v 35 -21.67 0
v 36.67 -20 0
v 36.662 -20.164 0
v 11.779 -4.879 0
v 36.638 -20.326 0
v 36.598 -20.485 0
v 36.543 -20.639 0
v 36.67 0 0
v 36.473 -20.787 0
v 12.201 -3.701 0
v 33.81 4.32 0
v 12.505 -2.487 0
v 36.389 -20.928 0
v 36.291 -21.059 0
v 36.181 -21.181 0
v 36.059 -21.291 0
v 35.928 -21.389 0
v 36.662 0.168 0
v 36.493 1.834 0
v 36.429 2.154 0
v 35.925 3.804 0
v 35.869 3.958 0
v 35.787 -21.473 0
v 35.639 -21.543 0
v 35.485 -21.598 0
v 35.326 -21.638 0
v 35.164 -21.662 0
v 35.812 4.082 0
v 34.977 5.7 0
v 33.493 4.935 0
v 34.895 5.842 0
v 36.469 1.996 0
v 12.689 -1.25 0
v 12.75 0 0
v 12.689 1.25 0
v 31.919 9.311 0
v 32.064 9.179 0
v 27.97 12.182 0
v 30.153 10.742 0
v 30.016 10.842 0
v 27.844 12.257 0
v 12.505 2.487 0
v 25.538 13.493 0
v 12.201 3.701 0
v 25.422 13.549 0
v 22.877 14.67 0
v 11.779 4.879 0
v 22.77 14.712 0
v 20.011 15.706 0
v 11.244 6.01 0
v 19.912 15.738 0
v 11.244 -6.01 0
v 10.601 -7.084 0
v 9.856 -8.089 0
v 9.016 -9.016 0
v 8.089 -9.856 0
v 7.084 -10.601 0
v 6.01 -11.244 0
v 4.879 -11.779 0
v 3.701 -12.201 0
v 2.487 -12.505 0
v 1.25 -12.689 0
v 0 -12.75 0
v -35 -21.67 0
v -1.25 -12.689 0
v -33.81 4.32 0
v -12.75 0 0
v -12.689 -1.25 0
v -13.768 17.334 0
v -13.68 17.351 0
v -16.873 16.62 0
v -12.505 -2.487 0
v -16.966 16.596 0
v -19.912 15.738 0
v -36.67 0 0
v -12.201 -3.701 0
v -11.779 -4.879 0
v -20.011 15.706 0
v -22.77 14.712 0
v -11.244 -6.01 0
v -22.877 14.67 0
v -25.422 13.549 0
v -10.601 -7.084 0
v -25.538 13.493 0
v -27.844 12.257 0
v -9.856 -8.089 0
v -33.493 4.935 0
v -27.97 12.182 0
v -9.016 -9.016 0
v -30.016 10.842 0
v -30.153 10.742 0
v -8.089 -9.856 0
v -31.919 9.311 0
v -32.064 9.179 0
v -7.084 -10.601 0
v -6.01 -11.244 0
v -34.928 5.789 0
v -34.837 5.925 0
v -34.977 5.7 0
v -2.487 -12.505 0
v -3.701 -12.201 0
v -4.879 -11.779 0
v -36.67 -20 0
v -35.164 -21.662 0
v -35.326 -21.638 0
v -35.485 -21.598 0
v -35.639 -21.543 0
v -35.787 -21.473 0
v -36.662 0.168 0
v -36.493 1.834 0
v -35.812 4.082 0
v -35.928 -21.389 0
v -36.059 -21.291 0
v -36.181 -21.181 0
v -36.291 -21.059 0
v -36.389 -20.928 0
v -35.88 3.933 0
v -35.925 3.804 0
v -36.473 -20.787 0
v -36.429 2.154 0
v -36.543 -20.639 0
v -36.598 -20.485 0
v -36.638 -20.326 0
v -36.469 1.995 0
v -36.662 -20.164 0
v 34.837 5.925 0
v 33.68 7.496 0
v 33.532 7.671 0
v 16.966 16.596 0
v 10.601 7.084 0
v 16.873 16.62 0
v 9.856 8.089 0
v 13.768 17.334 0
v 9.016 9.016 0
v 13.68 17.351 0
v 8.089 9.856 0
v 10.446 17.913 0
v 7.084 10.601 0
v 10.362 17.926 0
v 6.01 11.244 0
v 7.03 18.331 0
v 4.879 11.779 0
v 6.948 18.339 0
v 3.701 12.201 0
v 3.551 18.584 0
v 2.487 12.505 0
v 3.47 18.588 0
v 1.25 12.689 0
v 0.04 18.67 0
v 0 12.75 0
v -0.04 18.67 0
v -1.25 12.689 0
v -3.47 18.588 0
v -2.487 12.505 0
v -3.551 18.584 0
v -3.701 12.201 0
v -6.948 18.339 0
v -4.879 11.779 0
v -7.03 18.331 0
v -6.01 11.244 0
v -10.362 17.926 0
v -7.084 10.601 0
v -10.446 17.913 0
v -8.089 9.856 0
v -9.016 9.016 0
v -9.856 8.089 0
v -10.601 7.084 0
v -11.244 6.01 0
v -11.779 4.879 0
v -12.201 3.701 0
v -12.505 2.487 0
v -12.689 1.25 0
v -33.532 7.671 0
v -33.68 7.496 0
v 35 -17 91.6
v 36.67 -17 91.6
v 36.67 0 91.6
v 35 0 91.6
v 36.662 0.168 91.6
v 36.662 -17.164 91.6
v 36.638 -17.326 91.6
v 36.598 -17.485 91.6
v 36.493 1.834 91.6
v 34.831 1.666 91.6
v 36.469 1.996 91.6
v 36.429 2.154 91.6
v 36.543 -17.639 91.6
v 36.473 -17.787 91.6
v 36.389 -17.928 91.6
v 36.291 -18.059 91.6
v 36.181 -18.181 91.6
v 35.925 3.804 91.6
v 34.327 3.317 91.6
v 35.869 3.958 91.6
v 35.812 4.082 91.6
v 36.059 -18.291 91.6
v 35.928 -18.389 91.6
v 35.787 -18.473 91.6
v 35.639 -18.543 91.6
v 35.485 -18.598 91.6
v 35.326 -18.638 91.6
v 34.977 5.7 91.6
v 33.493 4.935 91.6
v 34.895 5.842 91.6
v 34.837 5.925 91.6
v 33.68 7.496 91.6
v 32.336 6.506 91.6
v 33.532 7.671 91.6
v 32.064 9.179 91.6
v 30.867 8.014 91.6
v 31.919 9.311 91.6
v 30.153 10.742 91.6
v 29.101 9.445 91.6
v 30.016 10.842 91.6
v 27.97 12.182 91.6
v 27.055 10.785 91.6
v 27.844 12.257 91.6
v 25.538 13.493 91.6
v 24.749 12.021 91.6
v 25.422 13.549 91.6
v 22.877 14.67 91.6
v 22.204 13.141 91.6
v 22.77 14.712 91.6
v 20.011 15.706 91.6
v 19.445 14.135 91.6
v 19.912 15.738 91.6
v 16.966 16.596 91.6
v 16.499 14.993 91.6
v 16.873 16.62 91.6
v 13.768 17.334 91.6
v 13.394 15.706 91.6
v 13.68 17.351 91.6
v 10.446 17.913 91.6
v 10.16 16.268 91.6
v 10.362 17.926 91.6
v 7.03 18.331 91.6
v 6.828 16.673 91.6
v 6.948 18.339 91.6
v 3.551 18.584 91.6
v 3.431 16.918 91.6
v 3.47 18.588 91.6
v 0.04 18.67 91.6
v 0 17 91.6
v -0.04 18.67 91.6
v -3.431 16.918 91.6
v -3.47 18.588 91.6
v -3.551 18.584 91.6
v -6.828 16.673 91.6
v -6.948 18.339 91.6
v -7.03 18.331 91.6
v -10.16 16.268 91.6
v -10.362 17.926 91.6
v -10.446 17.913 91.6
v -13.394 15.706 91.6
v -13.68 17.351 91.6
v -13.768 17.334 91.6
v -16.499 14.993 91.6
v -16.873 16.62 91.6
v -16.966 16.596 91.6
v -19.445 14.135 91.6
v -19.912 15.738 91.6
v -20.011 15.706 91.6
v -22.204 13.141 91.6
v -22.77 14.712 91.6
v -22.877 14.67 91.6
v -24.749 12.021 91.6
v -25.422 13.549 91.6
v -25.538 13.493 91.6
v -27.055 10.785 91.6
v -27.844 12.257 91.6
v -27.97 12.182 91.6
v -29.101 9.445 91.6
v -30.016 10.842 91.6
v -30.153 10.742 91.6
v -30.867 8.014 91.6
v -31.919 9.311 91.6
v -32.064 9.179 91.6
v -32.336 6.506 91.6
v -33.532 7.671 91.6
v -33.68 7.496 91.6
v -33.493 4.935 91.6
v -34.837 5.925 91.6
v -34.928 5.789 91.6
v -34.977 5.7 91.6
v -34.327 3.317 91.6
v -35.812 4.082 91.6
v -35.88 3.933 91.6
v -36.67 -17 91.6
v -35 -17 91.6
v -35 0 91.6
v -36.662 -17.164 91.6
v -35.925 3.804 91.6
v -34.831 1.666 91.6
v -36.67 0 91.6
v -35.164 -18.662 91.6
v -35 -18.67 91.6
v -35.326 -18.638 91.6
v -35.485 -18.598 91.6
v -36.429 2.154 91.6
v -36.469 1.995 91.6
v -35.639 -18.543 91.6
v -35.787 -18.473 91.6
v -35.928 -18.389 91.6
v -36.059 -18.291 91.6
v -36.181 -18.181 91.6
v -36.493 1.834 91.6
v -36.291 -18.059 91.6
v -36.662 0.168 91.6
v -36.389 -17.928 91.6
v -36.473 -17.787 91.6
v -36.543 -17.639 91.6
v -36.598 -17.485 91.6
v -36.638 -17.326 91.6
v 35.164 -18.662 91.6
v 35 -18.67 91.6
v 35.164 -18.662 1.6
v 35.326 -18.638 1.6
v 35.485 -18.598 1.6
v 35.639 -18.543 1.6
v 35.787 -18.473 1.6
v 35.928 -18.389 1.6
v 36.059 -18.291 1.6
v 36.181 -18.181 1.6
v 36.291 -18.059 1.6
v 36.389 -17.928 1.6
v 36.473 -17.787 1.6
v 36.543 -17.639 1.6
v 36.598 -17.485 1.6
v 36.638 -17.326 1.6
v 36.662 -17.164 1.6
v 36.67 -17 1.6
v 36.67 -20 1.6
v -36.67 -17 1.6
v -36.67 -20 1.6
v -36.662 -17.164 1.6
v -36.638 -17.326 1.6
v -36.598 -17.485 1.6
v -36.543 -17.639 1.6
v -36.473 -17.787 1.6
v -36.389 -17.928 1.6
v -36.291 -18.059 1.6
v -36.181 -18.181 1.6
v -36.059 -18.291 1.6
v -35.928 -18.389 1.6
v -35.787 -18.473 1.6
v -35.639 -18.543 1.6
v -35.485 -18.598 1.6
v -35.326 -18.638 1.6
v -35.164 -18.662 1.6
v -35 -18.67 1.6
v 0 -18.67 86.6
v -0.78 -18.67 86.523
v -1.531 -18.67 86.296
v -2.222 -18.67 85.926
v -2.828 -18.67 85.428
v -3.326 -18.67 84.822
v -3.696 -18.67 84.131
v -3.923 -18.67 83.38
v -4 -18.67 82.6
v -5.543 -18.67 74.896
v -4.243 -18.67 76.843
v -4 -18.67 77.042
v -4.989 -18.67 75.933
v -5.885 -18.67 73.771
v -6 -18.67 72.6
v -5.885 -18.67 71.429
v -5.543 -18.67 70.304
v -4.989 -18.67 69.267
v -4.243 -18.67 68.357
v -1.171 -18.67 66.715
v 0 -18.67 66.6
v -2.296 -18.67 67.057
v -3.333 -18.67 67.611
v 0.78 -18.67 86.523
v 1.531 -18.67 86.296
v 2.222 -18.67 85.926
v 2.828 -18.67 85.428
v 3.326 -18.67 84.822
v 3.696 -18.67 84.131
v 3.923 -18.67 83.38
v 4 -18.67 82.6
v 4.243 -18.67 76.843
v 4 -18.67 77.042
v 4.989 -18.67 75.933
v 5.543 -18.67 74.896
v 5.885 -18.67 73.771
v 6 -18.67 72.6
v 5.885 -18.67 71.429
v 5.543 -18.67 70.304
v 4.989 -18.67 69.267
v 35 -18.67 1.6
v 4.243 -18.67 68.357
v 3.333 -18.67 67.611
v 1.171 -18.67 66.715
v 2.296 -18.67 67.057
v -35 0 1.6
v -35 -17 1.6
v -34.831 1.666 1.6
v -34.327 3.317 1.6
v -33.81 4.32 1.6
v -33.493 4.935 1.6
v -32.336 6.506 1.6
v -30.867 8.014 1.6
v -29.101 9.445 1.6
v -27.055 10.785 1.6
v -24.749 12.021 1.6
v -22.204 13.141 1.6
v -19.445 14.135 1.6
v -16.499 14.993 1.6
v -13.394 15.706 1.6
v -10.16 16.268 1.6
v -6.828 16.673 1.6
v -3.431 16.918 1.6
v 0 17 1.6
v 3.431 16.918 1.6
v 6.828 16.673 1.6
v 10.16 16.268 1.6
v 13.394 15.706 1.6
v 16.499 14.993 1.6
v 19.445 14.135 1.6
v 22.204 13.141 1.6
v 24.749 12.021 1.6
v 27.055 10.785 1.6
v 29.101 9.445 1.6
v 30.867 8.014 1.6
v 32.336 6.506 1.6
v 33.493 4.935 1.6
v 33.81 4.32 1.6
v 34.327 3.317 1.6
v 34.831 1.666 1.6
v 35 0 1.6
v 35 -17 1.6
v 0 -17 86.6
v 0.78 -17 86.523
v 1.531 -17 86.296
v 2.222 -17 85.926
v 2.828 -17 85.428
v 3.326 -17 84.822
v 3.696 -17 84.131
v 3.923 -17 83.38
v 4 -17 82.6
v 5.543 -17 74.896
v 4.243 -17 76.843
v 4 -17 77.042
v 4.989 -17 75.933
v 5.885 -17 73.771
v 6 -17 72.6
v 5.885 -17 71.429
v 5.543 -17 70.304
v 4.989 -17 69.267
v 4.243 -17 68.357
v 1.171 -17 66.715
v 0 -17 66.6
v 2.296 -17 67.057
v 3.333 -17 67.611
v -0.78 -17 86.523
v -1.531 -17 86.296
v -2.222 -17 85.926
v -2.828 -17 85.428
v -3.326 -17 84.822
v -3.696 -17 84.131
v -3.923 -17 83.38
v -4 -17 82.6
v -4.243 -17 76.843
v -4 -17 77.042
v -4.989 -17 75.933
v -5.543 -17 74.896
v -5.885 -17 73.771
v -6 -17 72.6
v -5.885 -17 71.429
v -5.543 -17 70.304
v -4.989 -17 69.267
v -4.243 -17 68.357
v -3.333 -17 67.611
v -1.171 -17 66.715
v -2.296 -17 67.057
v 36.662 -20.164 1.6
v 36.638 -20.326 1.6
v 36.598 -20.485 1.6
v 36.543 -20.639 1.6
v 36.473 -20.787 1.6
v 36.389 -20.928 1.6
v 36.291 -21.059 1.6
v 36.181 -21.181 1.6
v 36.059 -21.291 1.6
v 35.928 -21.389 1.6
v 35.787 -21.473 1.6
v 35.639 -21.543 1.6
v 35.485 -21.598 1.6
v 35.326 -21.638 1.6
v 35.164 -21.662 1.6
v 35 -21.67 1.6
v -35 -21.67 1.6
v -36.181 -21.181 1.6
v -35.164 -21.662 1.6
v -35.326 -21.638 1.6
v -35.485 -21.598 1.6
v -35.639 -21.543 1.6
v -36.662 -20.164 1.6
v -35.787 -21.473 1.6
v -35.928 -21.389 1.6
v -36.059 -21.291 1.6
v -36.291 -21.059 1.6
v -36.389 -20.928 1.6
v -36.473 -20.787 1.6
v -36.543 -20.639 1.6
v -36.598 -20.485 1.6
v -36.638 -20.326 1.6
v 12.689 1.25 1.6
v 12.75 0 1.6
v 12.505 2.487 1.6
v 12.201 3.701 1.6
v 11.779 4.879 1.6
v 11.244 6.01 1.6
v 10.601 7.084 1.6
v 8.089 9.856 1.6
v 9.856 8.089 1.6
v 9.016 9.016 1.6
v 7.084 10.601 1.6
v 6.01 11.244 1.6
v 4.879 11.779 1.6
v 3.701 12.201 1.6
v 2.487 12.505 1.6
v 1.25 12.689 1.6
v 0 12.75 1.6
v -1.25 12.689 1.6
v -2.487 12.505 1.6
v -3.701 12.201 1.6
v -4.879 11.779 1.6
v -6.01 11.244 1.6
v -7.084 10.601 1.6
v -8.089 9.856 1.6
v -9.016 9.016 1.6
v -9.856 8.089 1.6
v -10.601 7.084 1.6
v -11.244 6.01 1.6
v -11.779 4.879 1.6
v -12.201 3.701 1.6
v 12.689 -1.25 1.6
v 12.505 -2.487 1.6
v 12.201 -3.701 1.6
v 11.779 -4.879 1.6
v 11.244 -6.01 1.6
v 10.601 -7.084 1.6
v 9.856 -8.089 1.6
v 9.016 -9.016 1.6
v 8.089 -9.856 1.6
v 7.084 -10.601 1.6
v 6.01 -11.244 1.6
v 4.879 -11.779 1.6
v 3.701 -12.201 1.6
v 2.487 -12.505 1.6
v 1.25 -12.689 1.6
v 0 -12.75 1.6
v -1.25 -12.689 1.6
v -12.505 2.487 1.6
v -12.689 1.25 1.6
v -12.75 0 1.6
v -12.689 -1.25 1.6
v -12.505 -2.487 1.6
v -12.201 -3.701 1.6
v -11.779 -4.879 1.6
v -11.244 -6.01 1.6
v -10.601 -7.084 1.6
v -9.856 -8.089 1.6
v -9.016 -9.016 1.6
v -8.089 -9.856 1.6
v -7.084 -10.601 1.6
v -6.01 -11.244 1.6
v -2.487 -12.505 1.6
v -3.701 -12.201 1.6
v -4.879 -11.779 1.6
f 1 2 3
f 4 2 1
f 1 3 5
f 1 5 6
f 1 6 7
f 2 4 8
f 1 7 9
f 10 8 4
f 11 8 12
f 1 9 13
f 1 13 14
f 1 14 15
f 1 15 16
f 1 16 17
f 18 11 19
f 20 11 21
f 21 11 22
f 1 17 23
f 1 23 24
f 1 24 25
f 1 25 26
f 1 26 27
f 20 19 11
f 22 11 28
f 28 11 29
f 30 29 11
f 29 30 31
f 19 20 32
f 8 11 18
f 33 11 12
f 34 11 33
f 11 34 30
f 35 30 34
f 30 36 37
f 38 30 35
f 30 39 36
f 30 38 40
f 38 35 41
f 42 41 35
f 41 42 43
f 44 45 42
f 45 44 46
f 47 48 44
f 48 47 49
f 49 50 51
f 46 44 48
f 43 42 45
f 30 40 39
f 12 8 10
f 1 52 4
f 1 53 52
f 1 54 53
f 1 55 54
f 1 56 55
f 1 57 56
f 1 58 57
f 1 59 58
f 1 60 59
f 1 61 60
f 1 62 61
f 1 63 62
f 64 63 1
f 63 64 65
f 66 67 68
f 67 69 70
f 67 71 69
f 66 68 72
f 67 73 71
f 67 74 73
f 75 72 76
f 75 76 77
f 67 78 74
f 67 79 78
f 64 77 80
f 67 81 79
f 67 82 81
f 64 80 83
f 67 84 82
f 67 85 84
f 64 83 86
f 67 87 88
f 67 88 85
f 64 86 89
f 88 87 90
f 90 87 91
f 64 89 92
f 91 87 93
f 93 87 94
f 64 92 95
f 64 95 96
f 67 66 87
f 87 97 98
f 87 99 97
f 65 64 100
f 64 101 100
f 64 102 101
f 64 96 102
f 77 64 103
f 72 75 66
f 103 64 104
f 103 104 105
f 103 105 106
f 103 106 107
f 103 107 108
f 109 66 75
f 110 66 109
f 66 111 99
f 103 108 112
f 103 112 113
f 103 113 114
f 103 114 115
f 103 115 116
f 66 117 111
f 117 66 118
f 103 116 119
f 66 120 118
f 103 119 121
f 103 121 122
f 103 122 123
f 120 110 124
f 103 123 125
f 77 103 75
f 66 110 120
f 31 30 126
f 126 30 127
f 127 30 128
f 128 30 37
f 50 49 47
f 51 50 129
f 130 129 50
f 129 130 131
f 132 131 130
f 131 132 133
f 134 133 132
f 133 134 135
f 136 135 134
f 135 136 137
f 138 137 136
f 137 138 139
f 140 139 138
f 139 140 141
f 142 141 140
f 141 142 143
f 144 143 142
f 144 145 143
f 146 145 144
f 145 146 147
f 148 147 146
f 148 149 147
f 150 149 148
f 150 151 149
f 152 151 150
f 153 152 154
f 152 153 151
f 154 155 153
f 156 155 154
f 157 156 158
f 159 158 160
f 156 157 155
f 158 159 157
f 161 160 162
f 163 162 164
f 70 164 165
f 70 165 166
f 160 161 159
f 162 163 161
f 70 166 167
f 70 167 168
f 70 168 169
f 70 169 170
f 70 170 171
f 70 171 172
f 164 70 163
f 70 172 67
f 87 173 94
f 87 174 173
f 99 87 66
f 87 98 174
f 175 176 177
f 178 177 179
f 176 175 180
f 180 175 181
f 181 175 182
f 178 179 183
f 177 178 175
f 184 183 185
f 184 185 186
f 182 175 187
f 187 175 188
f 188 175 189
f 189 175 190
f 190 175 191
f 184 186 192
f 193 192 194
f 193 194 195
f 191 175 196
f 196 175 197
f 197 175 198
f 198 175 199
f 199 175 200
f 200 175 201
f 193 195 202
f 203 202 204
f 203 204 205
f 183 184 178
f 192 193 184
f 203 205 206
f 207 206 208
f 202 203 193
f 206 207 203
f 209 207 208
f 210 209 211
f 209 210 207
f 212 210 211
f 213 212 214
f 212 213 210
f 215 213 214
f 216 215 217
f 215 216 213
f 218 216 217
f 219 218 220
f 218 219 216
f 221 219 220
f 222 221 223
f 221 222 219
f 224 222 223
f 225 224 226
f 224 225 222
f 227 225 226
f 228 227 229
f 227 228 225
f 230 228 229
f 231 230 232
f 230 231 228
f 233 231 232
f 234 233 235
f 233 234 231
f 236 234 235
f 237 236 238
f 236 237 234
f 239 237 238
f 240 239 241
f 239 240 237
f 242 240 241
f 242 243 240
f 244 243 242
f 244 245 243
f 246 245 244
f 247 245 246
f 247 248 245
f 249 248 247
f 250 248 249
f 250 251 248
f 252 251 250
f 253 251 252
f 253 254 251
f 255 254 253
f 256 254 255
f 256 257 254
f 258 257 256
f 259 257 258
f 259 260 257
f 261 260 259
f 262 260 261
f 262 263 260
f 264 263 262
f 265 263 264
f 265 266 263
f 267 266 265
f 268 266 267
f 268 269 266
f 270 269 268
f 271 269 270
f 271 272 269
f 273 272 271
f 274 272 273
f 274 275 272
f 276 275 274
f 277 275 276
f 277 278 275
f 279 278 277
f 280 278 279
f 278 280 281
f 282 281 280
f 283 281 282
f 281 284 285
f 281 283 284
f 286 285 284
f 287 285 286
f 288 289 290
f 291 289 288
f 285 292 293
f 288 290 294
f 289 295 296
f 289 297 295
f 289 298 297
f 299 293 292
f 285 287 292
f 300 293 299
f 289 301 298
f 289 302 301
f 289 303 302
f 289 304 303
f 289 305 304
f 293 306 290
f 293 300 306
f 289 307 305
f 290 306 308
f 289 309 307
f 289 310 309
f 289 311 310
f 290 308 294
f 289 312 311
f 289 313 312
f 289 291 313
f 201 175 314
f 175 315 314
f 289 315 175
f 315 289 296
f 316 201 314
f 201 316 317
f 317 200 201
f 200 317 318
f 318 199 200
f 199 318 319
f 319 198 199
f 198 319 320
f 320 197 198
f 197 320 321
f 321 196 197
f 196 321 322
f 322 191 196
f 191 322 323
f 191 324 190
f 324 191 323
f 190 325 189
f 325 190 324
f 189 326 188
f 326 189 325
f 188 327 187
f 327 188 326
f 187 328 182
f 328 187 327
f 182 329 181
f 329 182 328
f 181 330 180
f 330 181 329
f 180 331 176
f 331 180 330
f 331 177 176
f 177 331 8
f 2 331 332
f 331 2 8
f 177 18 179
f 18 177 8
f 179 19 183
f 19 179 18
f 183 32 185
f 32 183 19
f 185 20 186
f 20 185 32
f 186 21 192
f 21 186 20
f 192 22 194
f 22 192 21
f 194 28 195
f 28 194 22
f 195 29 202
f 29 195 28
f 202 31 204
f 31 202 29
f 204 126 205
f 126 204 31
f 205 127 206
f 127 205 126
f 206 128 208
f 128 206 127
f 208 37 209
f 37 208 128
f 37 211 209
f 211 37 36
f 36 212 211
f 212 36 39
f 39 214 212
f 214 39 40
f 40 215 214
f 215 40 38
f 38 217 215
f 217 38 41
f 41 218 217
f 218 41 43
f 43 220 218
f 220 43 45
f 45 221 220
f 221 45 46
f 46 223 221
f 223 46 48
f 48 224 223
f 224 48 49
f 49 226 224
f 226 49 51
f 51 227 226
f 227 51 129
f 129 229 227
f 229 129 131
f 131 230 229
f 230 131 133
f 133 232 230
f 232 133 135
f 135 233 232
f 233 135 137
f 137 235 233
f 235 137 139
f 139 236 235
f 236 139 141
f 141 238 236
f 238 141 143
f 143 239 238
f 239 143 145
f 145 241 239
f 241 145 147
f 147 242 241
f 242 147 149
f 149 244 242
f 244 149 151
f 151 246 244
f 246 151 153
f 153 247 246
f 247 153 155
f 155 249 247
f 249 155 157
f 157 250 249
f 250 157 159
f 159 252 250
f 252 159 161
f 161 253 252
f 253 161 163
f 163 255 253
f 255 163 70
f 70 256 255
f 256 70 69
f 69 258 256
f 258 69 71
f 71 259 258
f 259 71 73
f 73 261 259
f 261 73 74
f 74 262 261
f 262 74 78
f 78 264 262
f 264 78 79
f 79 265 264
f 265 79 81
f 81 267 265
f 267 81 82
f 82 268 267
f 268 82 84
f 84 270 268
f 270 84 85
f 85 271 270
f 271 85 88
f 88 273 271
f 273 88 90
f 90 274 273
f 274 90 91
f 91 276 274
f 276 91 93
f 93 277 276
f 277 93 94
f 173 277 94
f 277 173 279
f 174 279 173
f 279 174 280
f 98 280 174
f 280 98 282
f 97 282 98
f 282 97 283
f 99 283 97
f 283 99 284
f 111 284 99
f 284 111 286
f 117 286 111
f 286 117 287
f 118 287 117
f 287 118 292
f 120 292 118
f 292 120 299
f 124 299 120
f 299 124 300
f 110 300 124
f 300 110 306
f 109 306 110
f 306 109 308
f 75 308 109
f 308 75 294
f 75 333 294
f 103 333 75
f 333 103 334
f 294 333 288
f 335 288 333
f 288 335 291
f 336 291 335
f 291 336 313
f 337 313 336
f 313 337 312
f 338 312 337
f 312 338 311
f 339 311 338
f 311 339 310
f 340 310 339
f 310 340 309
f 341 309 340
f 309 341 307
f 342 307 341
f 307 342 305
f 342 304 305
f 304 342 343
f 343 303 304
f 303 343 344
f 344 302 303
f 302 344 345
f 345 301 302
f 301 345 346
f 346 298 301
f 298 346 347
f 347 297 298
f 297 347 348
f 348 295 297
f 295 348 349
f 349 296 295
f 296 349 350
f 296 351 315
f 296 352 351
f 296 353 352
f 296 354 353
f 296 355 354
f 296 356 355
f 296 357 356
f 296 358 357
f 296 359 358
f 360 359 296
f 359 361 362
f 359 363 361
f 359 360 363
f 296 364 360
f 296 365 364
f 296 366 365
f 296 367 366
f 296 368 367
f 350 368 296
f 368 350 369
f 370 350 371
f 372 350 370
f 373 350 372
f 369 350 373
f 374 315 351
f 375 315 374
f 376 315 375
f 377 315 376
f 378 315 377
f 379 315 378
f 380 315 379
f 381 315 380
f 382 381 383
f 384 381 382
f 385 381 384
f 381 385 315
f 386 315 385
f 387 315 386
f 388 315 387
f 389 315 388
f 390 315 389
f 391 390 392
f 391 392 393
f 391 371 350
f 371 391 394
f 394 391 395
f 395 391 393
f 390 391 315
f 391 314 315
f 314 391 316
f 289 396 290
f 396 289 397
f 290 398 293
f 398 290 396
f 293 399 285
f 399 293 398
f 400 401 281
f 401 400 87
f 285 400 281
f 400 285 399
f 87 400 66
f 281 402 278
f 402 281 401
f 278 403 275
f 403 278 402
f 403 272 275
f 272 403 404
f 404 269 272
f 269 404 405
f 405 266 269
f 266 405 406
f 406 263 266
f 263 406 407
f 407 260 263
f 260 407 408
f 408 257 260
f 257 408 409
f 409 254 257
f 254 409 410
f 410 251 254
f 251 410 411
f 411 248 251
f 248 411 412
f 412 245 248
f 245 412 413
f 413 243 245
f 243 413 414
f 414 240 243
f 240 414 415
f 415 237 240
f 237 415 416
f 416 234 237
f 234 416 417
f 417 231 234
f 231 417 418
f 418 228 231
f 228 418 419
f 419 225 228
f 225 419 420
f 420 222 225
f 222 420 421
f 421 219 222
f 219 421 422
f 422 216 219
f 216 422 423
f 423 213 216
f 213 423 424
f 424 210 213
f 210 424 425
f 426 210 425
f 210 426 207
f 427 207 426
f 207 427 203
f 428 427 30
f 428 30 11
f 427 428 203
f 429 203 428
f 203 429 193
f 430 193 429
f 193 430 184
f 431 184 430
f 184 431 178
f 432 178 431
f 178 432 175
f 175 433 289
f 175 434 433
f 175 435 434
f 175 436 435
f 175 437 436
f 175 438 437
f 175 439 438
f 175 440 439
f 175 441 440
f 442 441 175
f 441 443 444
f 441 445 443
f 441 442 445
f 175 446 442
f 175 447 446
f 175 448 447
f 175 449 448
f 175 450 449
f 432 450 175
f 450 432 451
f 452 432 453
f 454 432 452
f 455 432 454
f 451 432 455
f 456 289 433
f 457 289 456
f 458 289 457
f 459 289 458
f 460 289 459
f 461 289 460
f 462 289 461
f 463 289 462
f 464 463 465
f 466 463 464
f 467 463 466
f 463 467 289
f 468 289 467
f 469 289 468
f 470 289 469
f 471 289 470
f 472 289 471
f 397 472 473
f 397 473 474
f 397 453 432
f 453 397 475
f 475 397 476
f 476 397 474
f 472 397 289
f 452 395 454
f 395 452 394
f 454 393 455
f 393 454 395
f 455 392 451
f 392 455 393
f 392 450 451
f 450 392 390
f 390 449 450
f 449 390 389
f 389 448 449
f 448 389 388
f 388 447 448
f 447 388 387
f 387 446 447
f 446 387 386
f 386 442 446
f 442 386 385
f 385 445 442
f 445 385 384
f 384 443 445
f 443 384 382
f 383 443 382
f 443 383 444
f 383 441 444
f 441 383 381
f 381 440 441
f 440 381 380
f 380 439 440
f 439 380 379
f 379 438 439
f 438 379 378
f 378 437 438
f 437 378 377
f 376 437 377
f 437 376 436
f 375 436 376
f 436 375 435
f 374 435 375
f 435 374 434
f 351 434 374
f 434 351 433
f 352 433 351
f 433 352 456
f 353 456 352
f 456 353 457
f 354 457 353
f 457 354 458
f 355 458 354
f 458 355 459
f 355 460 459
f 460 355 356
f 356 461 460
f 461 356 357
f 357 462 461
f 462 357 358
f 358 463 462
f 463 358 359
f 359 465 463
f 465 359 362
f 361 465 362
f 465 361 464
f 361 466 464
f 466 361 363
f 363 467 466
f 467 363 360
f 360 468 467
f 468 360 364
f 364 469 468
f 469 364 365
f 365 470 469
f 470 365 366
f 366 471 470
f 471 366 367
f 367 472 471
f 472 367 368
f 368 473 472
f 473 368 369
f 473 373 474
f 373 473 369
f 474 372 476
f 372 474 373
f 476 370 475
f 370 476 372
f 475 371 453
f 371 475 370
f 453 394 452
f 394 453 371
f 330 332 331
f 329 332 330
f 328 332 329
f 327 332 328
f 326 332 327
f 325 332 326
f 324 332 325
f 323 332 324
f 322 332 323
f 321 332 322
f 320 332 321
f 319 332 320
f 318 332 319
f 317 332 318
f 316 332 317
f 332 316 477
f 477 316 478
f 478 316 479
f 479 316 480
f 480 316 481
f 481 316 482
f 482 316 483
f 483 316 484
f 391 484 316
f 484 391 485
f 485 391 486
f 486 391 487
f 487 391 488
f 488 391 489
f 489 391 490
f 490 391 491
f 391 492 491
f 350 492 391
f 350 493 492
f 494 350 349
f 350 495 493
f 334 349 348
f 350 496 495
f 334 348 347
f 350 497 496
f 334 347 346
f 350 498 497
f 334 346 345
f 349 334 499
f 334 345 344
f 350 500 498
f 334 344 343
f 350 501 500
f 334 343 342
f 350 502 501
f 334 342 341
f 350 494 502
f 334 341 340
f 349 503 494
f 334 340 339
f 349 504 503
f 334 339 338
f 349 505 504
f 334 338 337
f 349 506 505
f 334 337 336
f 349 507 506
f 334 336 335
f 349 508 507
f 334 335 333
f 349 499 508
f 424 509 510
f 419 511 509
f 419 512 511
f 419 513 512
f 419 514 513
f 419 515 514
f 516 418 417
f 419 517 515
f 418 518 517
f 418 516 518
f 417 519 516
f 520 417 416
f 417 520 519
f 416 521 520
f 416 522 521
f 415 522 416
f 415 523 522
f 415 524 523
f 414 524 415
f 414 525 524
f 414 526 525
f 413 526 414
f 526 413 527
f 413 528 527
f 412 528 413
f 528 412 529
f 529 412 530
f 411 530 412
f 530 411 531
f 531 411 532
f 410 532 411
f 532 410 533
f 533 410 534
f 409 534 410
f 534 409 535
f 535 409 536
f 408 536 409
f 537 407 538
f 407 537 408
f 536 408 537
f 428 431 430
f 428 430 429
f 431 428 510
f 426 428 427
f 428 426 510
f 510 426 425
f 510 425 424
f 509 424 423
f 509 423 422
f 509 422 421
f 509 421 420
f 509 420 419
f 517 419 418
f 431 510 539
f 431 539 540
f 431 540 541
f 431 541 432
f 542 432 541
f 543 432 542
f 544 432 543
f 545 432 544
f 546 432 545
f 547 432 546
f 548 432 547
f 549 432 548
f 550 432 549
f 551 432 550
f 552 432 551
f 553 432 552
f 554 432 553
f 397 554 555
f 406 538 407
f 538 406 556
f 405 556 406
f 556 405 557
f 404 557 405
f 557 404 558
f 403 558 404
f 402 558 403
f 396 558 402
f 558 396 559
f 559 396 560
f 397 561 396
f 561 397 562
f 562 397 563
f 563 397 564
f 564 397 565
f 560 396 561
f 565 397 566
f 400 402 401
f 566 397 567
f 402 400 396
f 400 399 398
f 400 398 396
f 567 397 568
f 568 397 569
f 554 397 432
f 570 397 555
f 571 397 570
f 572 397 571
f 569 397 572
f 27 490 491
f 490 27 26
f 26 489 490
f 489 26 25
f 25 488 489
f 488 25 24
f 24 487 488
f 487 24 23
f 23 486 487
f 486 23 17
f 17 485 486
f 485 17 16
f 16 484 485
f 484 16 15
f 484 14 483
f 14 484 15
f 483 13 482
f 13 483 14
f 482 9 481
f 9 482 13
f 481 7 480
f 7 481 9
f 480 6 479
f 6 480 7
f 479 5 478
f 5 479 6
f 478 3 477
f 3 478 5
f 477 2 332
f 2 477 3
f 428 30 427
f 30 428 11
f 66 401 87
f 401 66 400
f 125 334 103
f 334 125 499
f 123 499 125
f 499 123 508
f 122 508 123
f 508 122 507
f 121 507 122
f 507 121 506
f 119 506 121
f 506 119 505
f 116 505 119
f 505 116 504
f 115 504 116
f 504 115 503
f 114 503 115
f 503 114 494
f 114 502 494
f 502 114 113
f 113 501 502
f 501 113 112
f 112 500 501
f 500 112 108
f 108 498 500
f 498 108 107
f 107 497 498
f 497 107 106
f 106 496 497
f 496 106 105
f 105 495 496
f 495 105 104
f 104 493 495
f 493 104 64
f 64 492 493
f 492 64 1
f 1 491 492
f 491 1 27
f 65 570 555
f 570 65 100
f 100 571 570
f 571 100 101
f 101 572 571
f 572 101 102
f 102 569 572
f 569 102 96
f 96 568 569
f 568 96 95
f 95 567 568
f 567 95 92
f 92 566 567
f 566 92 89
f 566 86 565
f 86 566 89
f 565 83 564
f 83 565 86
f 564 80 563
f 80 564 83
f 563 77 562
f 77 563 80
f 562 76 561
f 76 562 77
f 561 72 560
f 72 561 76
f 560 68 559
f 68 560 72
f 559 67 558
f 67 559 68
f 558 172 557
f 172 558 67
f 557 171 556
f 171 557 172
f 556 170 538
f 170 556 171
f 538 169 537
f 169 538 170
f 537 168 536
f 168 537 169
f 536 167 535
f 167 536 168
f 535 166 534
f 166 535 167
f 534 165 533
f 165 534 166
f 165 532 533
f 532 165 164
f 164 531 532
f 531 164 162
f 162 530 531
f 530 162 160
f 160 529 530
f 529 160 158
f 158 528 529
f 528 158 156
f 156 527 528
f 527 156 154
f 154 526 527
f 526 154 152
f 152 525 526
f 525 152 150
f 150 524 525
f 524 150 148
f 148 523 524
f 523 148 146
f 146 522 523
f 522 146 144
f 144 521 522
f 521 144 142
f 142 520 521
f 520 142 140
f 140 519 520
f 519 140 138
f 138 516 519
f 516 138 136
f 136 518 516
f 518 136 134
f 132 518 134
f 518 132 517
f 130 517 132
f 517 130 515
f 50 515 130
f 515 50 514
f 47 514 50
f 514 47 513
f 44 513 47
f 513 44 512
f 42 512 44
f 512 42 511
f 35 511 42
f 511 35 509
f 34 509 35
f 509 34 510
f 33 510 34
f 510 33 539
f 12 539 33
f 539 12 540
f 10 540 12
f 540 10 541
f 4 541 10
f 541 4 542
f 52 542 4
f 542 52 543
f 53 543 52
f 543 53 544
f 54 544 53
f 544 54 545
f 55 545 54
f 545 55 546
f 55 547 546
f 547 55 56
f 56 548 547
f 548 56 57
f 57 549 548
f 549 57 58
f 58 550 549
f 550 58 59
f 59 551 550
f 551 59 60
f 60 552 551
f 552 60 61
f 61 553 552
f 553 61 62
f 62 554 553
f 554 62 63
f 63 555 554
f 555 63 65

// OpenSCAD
/******************************************************************************
 * PARAMETRIC CUSTOMIZABLE SHOWER BOTTLE HOLDER version 1.0 (2019-09-28)
 * Copyright (c) Michal A. Valasek, 2019, licensed under CC BY-NC-SA
 *               www.rider.cz | www.altair.blog
 *****************************************************************************/

/* [Dimensions] */
// Internal width
inner_diameter_x = 70;
// Internal depth
inner_diameter_y = 34;
// Internal height
inner_height = 90;

/* [Suction Cup Option] */
// Narrow part slot diameter
slot_diameter_narrow = 8;
// Wide part slot diameter
slot_diameter_wide = 12;
// Slot position from top
slot_position_from_top = 5;
// Lip depth
lip_depth = 3;

/* [Construction] */
// Wall thickness
wall_thickness = 1.67;
// Bottom thickness
bottom_thickness = 1.6;
// Relative diameter of bottom hole
bottom_hole_size = .75;

/* [Hidden] */
$fn = 64;

// Computed variables
total_height = inner_height + bottom_thickness;
slot_position = total_height - slot_position_from_top - slot_diameter_wide / 2 - slot_diameter_narrow;

// Bottom with lip
linear_extrude(bottom_thickness) difference() {
    union() {
        base();
        if(lip_depth > 0) translate([0, -lip_depth]) offset(wall_thickness) base();
    }
    if(bottom_hole_size > 0) circle(d = bottom_hole_size * min(inner_diameter_x, inner_diameter_y));
}

// Walls
difference() {
    // Walls proper
    linear_extrude(total_height) difference() {
        offset(wall_thickness) base();
        base();
    }

    // Keyhole slot
    translate([0, 0, slot_position]) rotate([90, 0, 0]) linear_extrude(inner_diameter_y) {
        circle(d = slot_diameter_wide, $fn = 32);
        hull() {
            circle(d = slot_diameter_narrow, $fn = 32);
            translate([0, (slot_diameter_wide + slot_diameter_narrow) / 2]) circle(d = slot_diameter_narrow, $fn = 32);
        }
    }
}

// Basic shape
module base(include_lip = false) {
    resize([inner_diameter_x, inner_diameter_y]) circle(d = max(inner_diameter_x, inner_diameter_y));
    translate([-inner_diameter_x / 2, -inner_diameter_y / 2]) square([inner_diameter_x, inner_diameter_y / 2]);
}
